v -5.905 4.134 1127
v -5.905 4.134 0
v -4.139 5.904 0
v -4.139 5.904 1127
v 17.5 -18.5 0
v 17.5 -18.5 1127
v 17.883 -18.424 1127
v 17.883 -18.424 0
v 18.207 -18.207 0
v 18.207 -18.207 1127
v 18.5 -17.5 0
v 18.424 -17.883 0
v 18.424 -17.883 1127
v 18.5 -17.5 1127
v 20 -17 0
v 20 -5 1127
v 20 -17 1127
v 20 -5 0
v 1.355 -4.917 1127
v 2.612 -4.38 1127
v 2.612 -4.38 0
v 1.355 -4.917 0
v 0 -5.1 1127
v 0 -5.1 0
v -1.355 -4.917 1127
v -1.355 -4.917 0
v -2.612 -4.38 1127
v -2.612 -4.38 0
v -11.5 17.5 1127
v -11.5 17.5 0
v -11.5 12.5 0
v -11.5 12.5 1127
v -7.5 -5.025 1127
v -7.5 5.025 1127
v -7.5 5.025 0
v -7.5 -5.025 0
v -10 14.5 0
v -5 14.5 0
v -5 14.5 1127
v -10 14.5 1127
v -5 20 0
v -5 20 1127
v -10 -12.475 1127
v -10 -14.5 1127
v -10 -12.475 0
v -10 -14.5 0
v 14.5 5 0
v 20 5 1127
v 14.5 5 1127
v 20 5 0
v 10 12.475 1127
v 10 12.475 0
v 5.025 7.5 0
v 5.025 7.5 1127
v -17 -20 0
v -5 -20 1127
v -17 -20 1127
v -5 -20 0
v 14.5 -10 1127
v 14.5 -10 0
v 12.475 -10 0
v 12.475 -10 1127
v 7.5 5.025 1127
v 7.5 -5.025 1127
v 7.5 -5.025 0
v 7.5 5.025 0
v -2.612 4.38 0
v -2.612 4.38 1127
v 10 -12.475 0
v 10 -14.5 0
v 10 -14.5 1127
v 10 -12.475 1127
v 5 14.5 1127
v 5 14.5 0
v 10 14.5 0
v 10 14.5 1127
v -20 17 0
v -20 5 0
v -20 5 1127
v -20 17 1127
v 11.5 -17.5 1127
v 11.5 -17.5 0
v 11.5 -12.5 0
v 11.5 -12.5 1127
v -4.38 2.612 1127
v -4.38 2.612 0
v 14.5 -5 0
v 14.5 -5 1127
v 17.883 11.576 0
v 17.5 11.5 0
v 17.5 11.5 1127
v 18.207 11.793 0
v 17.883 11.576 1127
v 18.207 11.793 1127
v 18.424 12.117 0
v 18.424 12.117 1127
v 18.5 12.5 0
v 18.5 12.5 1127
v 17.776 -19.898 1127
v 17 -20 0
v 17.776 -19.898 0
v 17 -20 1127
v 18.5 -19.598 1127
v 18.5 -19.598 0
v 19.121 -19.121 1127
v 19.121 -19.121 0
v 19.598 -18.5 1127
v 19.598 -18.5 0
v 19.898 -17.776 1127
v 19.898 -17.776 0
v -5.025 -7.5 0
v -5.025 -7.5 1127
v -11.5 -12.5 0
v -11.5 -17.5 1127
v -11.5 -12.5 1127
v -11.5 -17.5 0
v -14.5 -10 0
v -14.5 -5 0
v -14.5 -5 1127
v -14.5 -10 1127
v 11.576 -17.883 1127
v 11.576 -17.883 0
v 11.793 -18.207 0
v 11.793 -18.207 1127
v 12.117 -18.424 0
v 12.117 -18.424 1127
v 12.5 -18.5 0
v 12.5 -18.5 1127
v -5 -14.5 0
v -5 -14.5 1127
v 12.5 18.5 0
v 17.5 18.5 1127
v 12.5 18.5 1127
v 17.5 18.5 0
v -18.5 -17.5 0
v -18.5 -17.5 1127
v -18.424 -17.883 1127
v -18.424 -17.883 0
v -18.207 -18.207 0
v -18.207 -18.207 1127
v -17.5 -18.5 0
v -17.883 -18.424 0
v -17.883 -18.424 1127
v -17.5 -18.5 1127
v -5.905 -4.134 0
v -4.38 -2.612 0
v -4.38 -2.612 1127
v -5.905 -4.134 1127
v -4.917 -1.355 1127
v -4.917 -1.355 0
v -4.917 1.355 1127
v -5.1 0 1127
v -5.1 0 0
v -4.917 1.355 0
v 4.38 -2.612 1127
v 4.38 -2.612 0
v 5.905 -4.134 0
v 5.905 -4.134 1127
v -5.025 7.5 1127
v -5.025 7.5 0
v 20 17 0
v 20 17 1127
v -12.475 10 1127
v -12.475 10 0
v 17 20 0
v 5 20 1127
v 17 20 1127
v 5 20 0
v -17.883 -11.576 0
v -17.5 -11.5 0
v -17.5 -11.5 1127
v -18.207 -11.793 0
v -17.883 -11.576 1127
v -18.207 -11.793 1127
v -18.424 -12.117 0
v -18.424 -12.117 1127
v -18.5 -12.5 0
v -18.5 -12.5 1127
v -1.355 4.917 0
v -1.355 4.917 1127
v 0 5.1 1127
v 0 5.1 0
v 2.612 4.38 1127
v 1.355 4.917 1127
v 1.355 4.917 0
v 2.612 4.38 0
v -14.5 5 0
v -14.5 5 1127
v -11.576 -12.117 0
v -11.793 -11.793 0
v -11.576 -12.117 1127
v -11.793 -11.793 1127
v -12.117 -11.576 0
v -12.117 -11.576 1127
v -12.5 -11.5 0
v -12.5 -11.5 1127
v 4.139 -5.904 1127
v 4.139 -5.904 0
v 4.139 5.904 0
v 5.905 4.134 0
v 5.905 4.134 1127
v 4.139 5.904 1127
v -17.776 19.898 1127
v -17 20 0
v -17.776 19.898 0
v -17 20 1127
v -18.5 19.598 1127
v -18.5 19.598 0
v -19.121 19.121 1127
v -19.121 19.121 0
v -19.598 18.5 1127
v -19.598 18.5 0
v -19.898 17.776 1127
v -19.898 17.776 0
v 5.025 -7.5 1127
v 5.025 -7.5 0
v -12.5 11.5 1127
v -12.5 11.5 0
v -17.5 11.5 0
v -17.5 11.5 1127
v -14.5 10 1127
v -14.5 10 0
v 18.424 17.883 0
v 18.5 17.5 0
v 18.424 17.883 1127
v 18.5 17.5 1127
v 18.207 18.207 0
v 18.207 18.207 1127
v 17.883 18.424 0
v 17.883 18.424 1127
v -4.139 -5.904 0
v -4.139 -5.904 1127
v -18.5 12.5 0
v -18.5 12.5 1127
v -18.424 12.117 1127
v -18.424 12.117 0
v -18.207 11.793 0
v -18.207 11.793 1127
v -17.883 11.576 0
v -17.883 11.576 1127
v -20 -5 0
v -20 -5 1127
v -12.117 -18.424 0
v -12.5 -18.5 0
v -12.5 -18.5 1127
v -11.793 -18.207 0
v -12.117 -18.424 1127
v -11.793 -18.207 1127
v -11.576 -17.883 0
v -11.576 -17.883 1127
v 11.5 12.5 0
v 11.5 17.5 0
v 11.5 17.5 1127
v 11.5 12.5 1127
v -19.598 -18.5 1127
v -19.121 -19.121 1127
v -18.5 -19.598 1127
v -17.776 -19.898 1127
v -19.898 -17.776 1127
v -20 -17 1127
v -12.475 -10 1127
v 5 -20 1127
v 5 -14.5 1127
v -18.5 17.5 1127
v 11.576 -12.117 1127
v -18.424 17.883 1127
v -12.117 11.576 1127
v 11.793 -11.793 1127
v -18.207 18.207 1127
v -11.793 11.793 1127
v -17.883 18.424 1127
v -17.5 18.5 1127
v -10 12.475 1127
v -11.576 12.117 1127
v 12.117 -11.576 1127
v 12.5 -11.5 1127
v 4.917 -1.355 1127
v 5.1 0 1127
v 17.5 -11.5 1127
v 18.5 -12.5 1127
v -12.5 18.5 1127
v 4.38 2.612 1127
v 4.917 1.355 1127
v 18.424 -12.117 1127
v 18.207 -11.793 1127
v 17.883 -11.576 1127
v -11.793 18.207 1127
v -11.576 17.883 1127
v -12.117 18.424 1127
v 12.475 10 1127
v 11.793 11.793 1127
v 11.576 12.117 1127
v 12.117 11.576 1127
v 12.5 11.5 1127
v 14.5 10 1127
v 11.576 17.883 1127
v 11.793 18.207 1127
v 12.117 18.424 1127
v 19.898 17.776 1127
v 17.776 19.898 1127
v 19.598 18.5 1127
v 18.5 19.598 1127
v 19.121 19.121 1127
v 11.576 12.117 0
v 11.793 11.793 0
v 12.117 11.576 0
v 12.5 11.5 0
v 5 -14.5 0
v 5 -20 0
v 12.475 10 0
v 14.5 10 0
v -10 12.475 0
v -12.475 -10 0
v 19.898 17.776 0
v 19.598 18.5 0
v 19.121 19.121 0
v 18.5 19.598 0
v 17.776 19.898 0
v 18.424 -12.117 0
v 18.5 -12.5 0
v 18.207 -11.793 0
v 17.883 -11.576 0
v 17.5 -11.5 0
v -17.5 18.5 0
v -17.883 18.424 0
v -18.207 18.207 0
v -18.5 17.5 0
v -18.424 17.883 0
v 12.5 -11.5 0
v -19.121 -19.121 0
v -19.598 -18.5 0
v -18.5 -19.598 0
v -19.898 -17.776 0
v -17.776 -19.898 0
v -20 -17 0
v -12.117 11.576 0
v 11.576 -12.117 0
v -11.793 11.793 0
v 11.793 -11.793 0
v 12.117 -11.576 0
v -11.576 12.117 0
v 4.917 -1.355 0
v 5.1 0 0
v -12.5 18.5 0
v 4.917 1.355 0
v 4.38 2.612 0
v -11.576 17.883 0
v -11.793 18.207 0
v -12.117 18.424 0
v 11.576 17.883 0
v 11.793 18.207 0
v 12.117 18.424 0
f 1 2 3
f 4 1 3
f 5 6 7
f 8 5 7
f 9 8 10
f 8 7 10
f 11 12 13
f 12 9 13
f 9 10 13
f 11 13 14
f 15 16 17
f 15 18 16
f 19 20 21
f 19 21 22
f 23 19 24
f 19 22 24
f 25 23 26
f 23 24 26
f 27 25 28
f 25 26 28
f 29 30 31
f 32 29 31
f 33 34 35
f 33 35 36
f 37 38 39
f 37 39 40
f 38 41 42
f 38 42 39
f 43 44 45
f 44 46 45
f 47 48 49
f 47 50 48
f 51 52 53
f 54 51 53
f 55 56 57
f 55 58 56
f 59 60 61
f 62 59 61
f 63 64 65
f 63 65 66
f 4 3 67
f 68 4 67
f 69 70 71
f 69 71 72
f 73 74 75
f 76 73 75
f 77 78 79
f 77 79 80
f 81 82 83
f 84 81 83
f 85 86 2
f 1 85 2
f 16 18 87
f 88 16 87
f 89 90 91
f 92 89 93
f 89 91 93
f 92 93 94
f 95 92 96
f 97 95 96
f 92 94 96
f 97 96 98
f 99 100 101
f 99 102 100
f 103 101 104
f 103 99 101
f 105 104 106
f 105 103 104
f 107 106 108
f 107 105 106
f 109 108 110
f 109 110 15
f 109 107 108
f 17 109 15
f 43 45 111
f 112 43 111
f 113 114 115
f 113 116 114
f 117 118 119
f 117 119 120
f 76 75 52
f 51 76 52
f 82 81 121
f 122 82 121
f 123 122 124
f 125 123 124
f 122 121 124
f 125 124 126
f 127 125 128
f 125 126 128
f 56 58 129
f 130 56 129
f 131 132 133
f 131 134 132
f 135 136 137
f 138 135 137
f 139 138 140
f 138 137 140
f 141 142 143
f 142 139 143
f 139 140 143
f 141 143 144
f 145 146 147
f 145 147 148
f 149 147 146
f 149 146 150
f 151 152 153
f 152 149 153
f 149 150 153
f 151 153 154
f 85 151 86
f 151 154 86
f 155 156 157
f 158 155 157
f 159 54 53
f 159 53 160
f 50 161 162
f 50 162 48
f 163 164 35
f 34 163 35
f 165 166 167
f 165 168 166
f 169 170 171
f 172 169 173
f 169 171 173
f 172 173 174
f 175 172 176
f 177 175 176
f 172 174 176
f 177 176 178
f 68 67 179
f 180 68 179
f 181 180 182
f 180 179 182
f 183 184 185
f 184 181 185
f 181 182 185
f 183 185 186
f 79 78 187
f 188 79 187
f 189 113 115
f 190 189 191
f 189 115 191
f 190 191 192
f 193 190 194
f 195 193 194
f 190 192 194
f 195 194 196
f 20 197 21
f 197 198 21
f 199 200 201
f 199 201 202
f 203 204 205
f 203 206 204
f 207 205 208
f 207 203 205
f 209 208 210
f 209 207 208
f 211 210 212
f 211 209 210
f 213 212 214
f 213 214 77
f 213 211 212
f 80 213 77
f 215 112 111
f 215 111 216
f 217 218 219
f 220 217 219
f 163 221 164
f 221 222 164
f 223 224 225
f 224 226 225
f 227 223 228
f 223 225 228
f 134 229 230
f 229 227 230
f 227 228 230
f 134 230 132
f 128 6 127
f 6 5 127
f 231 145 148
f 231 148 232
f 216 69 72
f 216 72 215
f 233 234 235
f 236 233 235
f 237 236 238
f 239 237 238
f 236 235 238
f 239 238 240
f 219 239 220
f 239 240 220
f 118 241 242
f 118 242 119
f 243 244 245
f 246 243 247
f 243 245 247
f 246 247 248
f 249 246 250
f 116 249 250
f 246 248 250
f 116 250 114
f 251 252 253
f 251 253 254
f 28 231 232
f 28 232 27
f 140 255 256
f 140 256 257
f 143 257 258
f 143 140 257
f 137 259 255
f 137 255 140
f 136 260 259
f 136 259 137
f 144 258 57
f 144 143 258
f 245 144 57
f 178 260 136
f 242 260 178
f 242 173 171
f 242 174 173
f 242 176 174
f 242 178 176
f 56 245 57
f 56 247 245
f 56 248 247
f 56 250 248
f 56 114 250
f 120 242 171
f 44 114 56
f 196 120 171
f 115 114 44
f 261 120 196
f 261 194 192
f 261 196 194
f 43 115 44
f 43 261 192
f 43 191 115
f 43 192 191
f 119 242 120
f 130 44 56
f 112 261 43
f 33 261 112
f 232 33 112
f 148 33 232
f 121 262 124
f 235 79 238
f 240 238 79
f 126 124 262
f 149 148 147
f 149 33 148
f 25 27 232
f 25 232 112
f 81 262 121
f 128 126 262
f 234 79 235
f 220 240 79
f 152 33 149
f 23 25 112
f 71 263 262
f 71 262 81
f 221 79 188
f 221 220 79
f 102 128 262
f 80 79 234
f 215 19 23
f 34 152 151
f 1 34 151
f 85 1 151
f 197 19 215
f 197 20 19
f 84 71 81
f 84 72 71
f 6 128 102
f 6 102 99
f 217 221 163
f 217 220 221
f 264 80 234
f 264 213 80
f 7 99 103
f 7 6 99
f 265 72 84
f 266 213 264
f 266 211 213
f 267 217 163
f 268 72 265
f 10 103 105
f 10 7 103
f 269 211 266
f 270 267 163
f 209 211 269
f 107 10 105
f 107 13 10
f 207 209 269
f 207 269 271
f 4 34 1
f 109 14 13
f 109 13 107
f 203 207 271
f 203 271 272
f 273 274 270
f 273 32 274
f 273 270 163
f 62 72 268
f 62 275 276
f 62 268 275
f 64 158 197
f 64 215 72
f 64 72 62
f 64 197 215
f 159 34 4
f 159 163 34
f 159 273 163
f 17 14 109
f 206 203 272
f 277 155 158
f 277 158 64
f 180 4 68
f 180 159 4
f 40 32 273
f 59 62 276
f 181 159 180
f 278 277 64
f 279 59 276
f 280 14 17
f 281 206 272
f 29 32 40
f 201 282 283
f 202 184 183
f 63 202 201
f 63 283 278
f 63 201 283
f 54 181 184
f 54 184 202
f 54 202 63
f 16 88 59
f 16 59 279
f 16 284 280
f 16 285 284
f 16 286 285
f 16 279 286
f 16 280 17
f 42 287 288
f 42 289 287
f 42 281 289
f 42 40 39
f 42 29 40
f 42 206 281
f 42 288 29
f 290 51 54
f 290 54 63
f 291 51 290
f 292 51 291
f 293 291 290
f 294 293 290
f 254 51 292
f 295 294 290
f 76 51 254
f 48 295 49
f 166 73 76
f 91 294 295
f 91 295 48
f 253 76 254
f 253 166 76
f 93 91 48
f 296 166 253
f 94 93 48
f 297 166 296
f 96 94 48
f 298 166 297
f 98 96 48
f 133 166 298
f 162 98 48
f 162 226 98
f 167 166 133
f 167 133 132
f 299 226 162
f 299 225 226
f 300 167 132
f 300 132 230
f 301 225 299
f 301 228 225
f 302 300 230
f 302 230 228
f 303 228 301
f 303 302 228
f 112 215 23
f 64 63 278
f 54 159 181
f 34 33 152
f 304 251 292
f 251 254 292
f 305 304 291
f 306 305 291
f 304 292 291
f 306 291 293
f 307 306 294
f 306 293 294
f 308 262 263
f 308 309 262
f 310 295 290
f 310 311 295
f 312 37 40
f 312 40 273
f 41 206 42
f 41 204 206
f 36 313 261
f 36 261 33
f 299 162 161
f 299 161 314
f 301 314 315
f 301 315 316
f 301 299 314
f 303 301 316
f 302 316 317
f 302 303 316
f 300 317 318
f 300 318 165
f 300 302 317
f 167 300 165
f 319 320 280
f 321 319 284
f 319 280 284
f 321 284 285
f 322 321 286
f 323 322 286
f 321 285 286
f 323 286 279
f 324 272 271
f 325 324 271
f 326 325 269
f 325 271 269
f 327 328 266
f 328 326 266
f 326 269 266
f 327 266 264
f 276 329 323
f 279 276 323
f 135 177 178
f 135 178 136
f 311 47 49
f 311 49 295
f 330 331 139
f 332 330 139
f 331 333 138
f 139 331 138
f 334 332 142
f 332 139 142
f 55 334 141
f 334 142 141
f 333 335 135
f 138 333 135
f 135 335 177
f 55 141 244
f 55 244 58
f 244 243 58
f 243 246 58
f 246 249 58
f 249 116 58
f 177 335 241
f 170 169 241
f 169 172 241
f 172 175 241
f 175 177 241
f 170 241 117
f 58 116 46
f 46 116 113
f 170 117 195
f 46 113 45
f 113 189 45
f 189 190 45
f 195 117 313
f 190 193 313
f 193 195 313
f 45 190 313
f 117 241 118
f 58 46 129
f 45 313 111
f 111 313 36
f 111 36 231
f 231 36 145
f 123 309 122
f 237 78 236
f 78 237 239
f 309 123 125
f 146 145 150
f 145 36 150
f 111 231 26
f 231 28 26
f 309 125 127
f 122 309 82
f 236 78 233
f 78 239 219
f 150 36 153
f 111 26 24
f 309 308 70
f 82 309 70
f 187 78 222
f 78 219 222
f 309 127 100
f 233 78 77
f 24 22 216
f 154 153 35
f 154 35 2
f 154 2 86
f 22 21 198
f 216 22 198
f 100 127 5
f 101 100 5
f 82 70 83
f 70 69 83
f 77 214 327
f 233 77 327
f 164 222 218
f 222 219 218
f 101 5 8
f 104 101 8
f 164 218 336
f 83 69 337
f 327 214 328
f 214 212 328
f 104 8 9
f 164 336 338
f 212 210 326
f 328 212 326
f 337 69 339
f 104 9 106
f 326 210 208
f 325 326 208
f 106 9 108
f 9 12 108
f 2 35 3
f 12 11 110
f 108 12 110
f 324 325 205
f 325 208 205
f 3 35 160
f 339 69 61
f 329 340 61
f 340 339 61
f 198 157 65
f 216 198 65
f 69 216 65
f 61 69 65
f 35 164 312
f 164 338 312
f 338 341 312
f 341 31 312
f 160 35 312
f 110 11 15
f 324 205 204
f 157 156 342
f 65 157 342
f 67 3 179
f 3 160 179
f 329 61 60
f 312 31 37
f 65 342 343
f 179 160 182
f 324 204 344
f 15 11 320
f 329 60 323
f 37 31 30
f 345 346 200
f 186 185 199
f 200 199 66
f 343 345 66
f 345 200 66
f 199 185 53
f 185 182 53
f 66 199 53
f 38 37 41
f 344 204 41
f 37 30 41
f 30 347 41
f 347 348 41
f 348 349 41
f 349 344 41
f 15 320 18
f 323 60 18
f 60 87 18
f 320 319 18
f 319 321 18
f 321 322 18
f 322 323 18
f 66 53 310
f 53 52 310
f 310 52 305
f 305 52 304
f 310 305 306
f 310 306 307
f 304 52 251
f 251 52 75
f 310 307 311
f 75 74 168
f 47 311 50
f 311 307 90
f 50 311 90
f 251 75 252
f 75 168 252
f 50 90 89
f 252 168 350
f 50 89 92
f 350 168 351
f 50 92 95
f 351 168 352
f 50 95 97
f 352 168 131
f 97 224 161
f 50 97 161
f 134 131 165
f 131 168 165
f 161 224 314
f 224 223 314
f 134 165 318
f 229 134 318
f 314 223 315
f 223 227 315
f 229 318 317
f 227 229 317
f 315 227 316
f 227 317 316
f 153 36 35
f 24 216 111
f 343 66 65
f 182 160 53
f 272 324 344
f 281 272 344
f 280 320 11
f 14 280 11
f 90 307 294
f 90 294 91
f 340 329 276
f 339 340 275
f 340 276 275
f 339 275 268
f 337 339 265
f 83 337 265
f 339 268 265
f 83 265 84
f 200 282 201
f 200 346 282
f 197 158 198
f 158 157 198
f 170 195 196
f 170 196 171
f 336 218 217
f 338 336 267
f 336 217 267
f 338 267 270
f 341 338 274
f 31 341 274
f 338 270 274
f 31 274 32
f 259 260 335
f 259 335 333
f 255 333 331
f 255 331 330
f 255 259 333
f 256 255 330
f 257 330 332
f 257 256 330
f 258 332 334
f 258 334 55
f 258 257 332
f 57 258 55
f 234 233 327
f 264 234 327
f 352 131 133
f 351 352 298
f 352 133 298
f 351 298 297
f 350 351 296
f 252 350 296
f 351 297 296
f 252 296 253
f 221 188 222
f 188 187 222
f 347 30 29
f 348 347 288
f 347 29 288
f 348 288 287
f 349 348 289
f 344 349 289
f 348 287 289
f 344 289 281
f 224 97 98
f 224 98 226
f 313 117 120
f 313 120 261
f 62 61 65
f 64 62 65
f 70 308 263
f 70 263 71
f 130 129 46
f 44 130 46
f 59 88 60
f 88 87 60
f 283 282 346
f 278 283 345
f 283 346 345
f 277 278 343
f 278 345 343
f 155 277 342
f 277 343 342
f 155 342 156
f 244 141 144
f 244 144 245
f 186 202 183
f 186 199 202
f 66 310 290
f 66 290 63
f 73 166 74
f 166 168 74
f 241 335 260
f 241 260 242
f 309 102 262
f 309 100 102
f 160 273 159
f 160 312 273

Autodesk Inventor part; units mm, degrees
ref_plane "YZ Plane" through (0, 0, 0) normal (1, 0, 0) x (0, 1, 0)
ref_plane "XZ Plane" through (0, 0, 0) normal (0, 1, 0) x (-1, 0, 0)
ref_plane "XY Plane" through (0, 0, 0) normal (0, 0, 1) x (1, 0, 0)
sketch "T-Slot 4040 Base" plane through (0, 0, 0) normal (0, 0, 1) x (1, 0, 0)
  line L0 (-28, 0) -> (28, 0) construction
  line L1 (0, -28) -> (0, 28) construction
  circle A0 centre (0, 0) radius 5.1
  line L2 (-7.5, -7.5) -> (7.5, -7.5)
  line L3 (7.5, -7.5) -> (7.5, 7.5)
  line L4 (7.5, 7.5) -> (-7.5, 7.5)
  line L5 (-7.5, 7.5) -> (-7.5, -7.5)
  line L6 (-7.5, -7.5) -> (7.5, 7.5) construction
  line L7 (7.5, -7.5) -> (-7.5, 7.5) construction
  line L8 (-20, 20) -> (20, 20)
  line L9 (20, 20) -> (20, -20)
  line L10 (20, -20) -> (-20, -20)
  line L11 (-20, -20) -> (-20, 20)
  line L12 (-20, 20) -> (20, -20) construction
  line L13 (20, 20) -> (-20, -20) construction
  line L14 (20, 5) -> (14.5, 5)
  line L15 (14.5, 5) -> (14.5, 10)
  line L16 (14.5, 10) -> (12.4749, 10)
  line L17 (12.4749, 10) -> (7.5, 5.0251)
  line L18 (5, 20) -> (5, 14.5)
  line L19 (5, 14.5) -> (10, 14.5)
  line L20 (10, 14.5) -> (10, 12.4749)
  line L21 (10, 12.4749) -> (5.0251, 7.5)
  line L22 (18.5, 18.5) -> (11.5, 18.5)
  line L23 (11.5, 18.5) -> (11.5, 11.5)
  line L24 (11.5, 11.5) -> (18.5, 11.5)
  line L25 (18.5, 11.5) -> (18.5, 18.5)
  line L26 (18.5, 18.5) -> (11.5, 11.5) construction
  line L27 (11.5, 18.5) -> (18.5, 11.5) construction
  line L28 (3.0732, 1.3088) -> (4.38, 2.6125) construction
  line L29 (5.905, 4.1338) -> (4.1393, 5.9037)
  line L30 (4.1393, 5.9037) -> (2.6122, 4.3802)
  line L31 (1.3075, 3.0787) -> (3.0732, 1.3088) construction
  line L32 (3.0732, 1.3088) -> (4.1393, 5.9037) construction
  line L33 (5.905, 4.1338) -> (1.3075, 3.0787) construction
  line L34 (4.38, 2.6125) -> (5.905, 4.1338)
  line L35 (2.6122, 4.3802) -> (1.3075, 3.0787) construction
  line L36 (-20, 5) -> (-14.5, 5)
  line L37 (-14.5, 5) -> (-14.5, 10)
  line L38 (-14.5, 10) -> (-12.4749, 10)
  line L39 (-12.4749, 10) -> (-7.5, 5.0251)
  line L40 (-5, 20) -> (-5, 14.5)
  line L41 (-5, 14.5) -> (-10, 14.5)
  line L42 (-10, 14.5) -> (-10, 12.4749)
  line L43 (-10, 12.4749) -> (-5.0251, 7.5)
  line L44 (-18.5, 18.5) -> (-11.5, 18.5)
  line L45 (-11.5, 18.5) -> (-11.5, 11.5)
  line L46 (-11.5, 11.5) -> (-18.5, 11.5)
  line L47 (-18.5, 11.5) -> (-18.5, 18.5)
  line L48 (-5.905, 4.1338) -> (-4.1393, 5.9037)
  line L49 (-4.1393, 5.9037) -> (-2.6122, 4.3802)
  line L50 (-4.38, 2.6125) -> (-5.905, 4.1338)
  line L51 (7.5, -7.5) -> (-7.5, -7.5)
  line L52 (20, -5) -> (14.5, -5)
  line L53 (14.5, -5) -> (14.5, -10)
  line L54 (14.5, -10) -> (12.4749, -10)
  line L55 (12.4749, -10) -> (7.5, -5.0251)
  line L56 (5, -20) -> (5, -14.5)
  line L57 (5, -14.5) -> (10, -14.5)
  line L58 (10, -14.5) -> (10, -12.4749)
  line L59 (10, -12.4749) -> (5.0251, -7.5)
  line L60 (18.5, -18.5) -> (11.5, -18.5)
  line L61 (11.5, -18.5) -> (11.5, -11.5)
  line L62 (11.5, -11.5) -> (18.5, -11.5)
  line L63 (18.5, -11.5) -> (18.5, -18.5)
  line L64 (18.5, -18.5) -> (11.5, -11.5) construction
  line L65 (11.5, -18.5) -> (18.5, -11.5) construction
  line L66 (3.0732, -1.3088) -> (4.38, -2.6125) construction
  line L67 (5.905, -4.1338) -> (4.1393, -5.9037)
  line L68 (4.1393, -5.9037) -> (2.6122, -4.3802)
  line L69 (1.3075, -3.0787) -> (3.0732, -1.3088) construction
  line L70 (3.0732, -1.3088) -> (4.1393, -5.9037) construction
  line L71 (5.905, -4.1338) -> (1.3075, -3.0787) construction
  line L72 (4.38, -2.6125) -> (5.905, -4.1338)
  line L73 (2.6122, -4.3802) -> (1.3075, -3.0787) construction
  line L74 (-4.38, -2.6125) -> (-5.905, -4.1338)
  line L75 (-4.1393, -5.9037) -> (-2.6122, -4.3802)
  line L76 (-5.905, -4.1338) -> (-4.1393, -5.9037)
  line L77 (-12.4749, -10) -> (-7.5, -5.0251)
  line L78 (-10, -12.4749) -> (-5.0251, -7.5)
  line L79 (-10, -14.5) -> (-10, -12.4749)
  line L80 (-5, -14.5) -> (-10, -14.5)
  line L81 (-5, -20) -> (-5, -14.5)
  line L82 (-18.5, -18.5) -> (-11.5, -18.5)
  line L83 (-11.5, -18.5) -> (-11.5, -11.5)
  line L84 (-11.5, -11.5) -> (-18.5, -11.5)
  line L85 (-18.5, -11.5) -> (-18.5, -18.5)
  line L86 (-14.5, -10) -> (-12.4749, -10)
  line L87 (-14.5, -5) -> (-14.5, -10)
  line L88 (-20, -5) -> (-14.5, -5)
  point P0 (15, 15)
  point P1 (3.6062, 3.6062)
  point P2 (3.6062, 3.6062)
  point P3 (15, -15)
  point P4 (3.6062, -3.6062)
  point P5 (3.6062, -3.6062)
  dimension "d9" = 10.2
  dimension "d12" = 40
  dimension "d13" = 40
  dimension "d14" = 5.5
  dimension "d15" = 15
  dimension "d16" = 7
  dimension "d17" = 10
  dimension "d20" = 1.75
  dimension "d21" = 7
  dimension "d22" = 2
  dimension "d29" = 1.5
  dimension "d30" = 2.5
extrude "Extrusion1" add sketch "T-Slot 4040 Base" along normal blind 1127 contours L5 L4 L3 L2 | L2 L78 L79 L80 L81 L10 L11 L88 L87 L86 L77 L5 | L2 L3 L55 L54 L53 L52 L9 L10 L56 L57 L58 L59 | L39 L38 L37 L36 L11 L8 L40 L41 L42 L43 L4 L5 | L3 L4 L21 L20 L19 L18 L8 L9 L14 L15 L16 L17
fillet "Rundung1" radius 1 16 edges at (11.5, 18.5, 563.5) (18.5, 18.5, 563.5) (18.5, 11.5, 563.5) (11.5, 11.5, 563.5) (-11.5, 18.5, 563.5) (-18.5, 18.5, 563.5) (-18.5, 11.5, 563.5) (-11.5, 11.5, 563.5) (-18.5, -11.5, 563.5) (-11.5, -11.5, 563.5) (-11.5, -18.5, 563.5) (-18.5, -18.5, 563.5) (11.5, -18.5, 563.5) (11.5, -11.5, 563.5) (18.5, -11.5, 563.5) (18.5, -18.5, 563.5)
fillet "Rundung2" radius 3 4 edges at (20, 20, 563.5) (20, -20, 563.5) (-20, -20, 563.5) (-20, 20, 563.5)
properties part number "T-SLOT 4040 B-Type 1127mm"
